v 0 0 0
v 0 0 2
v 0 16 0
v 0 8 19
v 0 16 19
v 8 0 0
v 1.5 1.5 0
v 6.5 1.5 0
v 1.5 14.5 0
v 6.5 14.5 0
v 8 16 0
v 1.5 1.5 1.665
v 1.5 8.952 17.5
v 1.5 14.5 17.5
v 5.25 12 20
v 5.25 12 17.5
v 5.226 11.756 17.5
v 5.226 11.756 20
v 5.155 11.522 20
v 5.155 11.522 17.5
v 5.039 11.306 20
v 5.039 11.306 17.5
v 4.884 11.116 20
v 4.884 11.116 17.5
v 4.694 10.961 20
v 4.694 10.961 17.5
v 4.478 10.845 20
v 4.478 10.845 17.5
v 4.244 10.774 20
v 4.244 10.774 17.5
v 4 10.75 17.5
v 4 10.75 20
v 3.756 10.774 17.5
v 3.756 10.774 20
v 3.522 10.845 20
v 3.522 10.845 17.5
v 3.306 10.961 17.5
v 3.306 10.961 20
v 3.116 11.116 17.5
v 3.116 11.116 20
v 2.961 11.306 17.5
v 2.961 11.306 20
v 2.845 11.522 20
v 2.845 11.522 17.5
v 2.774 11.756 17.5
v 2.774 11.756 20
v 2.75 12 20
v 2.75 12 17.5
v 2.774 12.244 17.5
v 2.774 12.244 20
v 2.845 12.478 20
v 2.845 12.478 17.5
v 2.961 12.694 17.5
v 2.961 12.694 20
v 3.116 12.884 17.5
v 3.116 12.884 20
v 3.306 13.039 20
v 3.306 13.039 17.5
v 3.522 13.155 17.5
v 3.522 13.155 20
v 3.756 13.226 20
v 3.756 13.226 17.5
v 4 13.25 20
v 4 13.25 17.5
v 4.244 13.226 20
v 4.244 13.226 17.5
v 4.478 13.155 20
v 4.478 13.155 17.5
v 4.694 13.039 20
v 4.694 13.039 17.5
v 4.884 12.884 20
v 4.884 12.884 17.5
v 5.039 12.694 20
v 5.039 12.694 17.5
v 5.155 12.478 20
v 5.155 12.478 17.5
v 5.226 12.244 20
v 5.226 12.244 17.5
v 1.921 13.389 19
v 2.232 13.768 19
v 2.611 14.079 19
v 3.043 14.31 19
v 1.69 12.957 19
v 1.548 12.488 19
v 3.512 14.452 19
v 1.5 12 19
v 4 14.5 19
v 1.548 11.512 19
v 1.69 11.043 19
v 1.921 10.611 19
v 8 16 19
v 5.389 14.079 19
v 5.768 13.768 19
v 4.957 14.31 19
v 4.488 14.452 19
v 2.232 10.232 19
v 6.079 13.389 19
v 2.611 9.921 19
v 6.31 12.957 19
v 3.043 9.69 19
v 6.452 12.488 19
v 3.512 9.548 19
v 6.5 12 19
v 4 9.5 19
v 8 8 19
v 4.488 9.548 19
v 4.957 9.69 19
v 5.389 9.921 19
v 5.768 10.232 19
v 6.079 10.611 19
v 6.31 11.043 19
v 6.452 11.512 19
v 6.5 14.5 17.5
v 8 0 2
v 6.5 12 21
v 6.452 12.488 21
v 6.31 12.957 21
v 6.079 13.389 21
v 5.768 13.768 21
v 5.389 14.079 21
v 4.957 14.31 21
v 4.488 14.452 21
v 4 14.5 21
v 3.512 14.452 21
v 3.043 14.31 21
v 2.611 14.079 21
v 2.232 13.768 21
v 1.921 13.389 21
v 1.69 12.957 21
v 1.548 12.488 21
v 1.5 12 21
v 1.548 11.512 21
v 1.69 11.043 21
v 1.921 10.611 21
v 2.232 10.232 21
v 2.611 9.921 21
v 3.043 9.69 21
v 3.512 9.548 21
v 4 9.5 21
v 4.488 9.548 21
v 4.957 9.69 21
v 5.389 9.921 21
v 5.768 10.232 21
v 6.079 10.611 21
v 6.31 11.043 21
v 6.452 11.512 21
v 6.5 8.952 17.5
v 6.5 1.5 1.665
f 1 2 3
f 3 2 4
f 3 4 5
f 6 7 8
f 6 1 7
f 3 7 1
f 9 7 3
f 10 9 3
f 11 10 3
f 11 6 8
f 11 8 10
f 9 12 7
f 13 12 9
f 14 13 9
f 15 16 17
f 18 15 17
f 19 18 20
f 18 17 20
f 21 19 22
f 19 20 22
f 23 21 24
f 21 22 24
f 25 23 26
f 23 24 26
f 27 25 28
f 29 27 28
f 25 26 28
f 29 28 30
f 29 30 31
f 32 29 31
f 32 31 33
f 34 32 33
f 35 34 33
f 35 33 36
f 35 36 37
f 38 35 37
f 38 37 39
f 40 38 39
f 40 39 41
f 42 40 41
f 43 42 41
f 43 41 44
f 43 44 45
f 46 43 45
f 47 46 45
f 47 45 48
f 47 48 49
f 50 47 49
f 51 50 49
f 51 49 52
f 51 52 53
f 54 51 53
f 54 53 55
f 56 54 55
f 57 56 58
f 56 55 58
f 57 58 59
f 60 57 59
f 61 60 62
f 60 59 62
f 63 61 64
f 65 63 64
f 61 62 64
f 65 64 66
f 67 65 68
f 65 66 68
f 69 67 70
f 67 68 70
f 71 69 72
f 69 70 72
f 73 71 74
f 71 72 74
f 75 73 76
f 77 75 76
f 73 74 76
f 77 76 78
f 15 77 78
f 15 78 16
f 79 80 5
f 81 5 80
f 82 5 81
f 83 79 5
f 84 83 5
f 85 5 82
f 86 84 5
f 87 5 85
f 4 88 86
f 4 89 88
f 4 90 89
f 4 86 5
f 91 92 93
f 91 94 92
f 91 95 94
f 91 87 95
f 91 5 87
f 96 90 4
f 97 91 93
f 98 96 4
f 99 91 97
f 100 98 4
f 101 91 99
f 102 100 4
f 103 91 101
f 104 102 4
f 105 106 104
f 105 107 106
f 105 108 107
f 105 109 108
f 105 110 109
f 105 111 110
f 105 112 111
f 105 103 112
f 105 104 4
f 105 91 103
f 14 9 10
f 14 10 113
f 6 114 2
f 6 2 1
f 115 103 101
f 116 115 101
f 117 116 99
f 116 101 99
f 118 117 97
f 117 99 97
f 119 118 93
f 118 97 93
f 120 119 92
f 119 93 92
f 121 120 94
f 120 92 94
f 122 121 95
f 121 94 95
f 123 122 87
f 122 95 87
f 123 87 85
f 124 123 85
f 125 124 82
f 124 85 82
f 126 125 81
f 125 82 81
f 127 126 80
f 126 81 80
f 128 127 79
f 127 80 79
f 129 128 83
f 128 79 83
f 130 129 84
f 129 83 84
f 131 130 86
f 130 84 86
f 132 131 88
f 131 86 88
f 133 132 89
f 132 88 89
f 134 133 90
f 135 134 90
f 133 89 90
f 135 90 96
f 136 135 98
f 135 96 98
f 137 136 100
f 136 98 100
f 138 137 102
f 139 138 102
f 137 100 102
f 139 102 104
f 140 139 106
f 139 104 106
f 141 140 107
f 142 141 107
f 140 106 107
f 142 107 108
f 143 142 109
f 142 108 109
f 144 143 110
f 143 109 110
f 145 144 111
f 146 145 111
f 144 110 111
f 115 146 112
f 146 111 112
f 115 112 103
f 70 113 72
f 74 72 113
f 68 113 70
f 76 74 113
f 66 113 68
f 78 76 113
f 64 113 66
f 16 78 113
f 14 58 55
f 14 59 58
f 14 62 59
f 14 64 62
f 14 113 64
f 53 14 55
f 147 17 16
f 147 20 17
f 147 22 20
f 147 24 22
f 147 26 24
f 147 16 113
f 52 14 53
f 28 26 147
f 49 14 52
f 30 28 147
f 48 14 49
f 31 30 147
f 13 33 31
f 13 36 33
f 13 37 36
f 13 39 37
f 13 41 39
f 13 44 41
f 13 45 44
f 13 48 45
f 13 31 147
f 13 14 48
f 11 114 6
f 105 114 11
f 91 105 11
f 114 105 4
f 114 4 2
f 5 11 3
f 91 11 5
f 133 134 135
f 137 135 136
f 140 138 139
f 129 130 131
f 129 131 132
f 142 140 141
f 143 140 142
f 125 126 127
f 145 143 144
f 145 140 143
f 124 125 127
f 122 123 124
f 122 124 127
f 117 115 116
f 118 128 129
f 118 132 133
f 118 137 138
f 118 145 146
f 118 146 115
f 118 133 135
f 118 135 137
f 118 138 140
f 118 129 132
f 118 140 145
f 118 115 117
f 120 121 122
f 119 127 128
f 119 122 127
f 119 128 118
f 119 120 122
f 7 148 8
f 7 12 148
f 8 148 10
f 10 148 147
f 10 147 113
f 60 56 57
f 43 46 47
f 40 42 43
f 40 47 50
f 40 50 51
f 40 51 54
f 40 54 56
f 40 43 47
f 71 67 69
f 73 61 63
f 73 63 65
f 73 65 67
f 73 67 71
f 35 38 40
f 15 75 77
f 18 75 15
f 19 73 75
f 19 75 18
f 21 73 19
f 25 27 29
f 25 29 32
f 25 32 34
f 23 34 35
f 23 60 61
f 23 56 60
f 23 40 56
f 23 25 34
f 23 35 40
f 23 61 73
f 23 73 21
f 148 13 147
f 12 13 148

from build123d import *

# Parameters (mm, degrees)
F1_DEPTH = 4
F3_DEPTH = 2.5
F5_R     = 2.5
F6_DEPTH = 2
F7_R     = 1.25
F8_DEPTH = 20


with BuildPart() as f1:
    # F0 (on Right) → F1 (new body)
    with BuildSketch(Plane.YZ):
        Polygon((0, 2), (0, 0), (16, 0), (16, 19), (8, 19), align=None)
    extrude(amount=F1_DEPTH)

    # F2 (on face) → F3 (cut)
    with BuildSketch(Plane.YZ.offset(4)):
        Polygon((14.5, 0), (14.5, 17.5), (8.951908, 17.5), (1.5, 1.664695), (1.5, 0), align=None)
    extrude(amount=-F3_DEPTH, mode=Mode.SUBTRACT)

    # F4: F1 across face


with BuildPart() as f1_1:
    add(f1.part)
    add(f1.part.mirror(Plane(origin=(4, 9.86239, 10.544939), x_dir=(0, 1, 0), z_dir=(1, 0, 0))))

    # F5 (on face) → F6 (join)
    with BuildSketch(Plane.XY.offset(19)):
        with Locations((4, 12)):
            Circle(F5_R)
    extrude(amount=F6_DEPTH)

    # F7 (on face) → F8 (cut)
    with BuildSketch(Plane(origin=(0, 0, 0), x_dir=(1, 0, 0), z_dir=(0, 0, -1))):
        with Locations((4, -12)):
            Circle(F7_R)
    extrude(amount=-F8_DEPTH, mode=Mode.SUBTRACT)


solid = f1_1.part
